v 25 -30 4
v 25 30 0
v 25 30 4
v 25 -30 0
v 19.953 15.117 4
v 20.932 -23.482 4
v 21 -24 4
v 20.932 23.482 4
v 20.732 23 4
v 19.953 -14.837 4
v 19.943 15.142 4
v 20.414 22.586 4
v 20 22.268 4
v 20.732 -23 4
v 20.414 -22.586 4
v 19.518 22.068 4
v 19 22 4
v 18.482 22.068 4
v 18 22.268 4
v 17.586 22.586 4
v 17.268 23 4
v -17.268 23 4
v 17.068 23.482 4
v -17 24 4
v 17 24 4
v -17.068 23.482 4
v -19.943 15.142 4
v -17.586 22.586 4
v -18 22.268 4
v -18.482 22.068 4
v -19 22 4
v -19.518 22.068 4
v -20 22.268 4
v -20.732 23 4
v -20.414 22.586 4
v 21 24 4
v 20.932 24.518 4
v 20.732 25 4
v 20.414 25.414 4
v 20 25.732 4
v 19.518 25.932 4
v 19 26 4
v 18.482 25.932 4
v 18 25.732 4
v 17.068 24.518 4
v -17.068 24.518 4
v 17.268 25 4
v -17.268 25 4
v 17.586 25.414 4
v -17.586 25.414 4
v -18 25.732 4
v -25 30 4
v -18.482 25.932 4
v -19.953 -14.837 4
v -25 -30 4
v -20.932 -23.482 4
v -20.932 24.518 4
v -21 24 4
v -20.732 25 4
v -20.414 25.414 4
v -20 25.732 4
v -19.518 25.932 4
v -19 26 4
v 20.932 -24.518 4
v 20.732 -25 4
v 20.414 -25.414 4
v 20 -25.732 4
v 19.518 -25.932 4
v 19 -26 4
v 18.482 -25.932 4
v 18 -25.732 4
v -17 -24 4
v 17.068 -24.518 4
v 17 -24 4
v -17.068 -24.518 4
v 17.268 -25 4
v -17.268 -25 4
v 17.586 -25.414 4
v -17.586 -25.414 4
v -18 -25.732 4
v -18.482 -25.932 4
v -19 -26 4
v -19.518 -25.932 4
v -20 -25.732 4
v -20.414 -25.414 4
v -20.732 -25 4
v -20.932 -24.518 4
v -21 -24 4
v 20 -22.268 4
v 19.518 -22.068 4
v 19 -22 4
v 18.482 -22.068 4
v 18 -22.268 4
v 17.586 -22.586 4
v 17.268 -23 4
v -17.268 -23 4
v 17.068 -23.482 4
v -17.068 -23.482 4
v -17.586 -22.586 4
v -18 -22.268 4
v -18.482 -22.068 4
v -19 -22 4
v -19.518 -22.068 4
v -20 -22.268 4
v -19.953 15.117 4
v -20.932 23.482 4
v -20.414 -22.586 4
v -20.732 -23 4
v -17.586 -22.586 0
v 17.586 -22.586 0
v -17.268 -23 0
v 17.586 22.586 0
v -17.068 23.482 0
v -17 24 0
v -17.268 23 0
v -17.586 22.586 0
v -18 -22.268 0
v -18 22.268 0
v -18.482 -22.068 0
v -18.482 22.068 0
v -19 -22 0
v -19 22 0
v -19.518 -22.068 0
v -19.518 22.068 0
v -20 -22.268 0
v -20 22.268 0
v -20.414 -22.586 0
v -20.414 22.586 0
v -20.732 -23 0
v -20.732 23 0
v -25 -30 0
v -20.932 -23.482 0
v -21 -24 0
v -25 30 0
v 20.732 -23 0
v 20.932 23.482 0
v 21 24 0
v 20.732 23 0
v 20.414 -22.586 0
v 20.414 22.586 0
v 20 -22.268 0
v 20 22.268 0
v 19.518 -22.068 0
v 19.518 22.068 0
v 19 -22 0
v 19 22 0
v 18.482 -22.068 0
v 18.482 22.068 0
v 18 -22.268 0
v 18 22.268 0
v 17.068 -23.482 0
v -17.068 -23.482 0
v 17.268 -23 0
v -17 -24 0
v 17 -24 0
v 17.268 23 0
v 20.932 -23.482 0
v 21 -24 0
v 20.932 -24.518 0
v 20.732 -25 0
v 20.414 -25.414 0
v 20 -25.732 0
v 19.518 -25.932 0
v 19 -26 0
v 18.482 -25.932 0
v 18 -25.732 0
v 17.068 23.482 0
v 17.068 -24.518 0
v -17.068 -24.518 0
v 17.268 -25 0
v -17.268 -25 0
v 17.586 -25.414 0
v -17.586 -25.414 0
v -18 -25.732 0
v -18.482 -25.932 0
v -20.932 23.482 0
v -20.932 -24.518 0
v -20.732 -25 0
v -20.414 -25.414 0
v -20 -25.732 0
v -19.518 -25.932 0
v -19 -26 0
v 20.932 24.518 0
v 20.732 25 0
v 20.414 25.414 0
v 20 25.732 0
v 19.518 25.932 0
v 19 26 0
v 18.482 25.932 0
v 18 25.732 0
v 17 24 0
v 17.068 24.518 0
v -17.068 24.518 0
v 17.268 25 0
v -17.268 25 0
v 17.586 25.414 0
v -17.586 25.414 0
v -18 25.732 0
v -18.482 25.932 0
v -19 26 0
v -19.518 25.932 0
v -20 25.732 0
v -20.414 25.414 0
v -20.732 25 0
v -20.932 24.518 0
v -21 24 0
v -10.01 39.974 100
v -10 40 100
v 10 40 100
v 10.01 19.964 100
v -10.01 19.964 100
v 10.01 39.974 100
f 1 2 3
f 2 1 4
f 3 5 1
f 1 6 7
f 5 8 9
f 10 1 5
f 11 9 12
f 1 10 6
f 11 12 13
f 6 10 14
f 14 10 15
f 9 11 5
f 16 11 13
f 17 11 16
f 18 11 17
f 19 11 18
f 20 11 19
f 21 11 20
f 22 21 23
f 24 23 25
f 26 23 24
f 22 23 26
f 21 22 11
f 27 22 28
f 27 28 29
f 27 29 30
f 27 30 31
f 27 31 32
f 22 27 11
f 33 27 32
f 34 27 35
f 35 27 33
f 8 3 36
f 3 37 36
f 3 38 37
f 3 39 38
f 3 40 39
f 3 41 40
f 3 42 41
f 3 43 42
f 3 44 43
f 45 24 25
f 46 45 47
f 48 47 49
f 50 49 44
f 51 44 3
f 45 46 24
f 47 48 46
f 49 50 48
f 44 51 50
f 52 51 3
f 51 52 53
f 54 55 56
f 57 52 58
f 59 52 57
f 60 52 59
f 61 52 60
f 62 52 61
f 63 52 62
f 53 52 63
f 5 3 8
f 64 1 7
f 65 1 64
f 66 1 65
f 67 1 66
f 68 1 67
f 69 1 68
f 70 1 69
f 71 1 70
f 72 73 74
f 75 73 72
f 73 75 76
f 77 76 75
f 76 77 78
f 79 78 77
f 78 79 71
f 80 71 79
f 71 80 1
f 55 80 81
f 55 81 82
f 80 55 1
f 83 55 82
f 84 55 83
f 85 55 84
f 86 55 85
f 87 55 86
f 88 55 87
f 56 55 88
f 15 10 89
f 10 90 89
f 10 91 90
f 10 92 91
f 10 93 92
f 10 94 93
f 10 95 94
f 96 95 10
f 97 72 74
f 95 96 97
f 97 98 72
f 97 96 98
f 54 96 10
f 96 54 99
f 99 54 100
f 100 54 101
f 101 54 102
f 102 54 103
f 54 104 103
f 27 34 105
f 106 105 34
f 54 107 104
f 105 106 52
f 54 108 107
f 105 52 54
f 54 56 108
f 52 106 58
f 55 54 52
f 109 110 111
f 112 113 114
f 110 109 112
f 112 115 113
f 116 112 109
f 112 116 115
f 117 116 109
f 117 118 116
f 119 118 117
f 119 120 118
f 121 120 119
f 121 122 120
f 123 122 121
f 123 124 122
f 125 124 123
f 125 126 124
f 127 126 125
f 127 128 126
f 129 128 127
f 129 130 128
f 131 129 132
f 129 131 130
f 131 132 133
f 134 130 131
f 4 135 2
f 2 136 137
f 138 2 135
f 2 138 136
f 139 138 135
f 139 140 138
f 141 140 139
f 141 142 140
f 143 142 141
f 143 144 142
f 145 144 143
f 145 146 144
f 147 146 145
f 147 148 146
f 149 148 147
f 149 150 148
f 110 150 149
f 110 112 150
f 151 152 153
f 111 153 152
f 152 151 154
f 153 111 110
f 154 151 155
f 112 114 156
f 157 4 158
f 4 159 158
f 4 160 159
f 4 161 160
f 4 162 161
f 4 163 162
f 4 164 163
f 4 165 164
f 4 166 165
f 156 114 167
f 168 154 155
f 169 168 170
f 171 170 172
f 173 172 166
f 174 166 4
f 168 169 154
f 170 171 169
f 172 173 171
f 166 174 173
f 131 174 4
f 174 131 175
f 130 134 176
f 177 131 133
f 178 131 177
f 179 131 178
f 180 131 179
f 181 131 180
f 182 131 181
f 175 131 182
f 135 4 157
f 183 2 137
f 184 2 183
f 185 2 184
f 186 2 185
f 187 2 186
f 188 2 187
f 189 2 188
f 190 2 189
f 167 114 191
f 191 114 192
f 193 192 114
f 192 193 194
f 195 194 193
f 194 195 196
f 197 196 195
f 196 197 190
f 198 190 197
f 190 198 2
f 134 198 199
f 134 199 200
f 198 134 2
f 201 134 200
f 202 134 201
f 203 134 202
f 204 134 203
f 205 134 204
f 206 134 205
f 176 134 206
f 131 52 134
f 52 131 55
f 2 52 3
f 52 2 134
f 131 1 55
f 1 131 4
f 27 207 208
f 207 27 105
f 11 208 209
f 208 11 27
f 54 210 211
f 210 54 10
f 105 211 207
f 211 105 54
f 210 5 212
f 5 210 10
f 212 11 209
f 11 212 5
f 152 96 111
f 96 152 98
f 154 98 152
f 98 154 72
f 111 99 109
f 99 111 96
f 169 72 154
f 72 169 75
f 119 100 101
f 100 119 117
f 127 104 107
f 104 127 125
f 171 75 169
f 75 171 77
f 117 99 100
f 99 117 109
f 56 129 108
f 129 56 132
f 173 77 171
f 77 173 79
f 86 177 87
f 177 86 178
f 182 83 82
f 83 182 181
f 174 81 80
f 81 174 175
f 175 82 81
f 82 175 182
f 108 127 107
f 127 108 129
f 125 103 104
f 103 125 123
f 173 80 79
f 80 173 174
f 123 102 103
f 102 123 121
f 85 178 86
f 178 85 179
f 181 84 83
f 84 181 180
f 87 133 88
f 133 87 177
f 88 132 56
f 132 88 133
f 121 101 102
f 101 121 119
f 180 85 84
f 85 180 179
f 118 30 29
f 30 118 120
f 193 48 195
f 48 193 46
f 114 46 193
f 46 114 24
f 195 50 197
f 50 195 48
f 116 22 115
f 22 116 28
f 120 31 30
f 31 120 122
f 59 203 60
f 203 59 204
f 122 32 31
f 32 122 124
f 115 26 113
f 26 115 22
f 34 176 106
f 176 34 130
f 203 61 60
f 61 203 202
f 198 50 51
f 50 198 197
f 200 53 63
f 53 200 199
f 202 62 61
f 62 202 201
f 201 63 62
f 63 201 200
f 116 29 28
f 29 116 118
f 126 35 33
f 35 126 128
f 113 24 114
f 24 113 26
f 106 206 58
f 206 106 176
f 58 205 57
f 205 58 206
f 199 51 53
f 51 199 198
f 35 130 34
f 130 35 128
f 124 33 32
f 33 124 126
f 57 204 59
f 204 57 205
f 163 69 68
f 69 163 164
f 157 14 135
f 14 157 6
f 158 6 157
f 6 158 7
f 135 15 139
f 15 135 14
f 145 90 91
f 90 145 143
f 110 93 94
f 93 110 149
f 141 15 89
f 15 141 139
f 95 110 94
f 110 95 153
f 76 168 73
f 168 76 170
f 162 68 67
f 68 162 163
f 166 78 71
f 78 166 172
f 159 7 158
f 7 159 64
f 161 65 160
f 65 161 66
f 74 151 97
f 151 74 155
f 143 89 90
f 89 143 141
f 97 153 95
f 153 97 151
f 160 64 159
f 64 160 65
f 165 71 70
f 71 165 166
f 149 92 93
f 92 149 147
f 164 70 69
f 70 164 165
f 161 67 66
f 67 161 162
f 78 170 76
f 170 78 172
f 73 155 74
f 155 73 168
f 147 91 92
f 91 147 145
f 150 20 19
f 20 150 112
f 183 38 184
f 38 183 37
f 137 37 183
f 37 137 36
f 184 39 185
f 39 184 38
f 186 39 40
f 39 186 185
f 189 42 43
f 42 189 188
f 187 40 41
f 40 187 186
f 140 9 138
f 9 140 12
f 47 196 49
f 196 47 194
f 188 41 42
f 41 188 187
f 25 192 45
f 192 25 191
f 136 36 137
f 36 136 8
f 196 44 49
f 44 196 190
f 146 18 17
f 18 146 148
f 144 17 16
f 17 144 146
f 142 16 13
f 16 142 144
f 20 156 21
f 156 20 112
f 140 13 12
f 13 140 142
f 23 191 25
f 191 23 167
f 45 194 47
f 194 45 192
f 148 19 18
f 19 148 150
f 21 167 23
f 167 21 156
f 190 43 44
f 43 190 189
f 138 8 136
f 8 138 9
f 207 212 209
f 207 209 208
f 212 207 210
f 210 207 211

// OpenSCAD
/**
 * a parameterized model for a furniture leg
 */
plate_thickness = 4; // mm
plate_width_x = 50; // mm
plate_width_y = 60; // mm
leg_width_x_top = 40; // mm
leg_width_y_top = 30; // mm
leg_offset_x = 0; // mm
leg_offset_y = 30; // mm
leg_width_x_bottom = 20; // mm
leg_width_y_bottom = 20; // mm
leg_height = 100; // mm
hole_diameter = 4; // mm

$fn=24;

module bottom(extra) {
  translate([leg_offset_x, leg_offset_y, leg_height + (0.1 + extra) / 2]) {
    cube([leg_width_x_bottom + extra, leg_width_y_bottom + extra, 0.1 + extra], center=true);
  }
}

difference() {
  union() {
    translate([0, 0, plate_thickness / 2]) {
      cube([plate_width_x, plate_width_y, plate_thickness], center=true);
    }
    hull() {
      translate([0, 0, plate_thickness - 0.5]) {
        cube([leg_width_x_top, leg_width_y_top, 0.1], center=true);
      }
      bottom(0);
    }
  }
  bottom(10);

  for (xd=[-1, 1]) {
    for (yd=[-1, 1]) {
      translate([
          xd * (plate_width_x / 2 - 1.5 * hole_diameter),
          yd * (plate_width_y / 2 - 1.5 * hole_diameter),
          plate_thickness / 2]) {
        cylinder(d=hole_diameter, h=plate_thickness + 0.1, center=true);
      }
    }
  }
}
